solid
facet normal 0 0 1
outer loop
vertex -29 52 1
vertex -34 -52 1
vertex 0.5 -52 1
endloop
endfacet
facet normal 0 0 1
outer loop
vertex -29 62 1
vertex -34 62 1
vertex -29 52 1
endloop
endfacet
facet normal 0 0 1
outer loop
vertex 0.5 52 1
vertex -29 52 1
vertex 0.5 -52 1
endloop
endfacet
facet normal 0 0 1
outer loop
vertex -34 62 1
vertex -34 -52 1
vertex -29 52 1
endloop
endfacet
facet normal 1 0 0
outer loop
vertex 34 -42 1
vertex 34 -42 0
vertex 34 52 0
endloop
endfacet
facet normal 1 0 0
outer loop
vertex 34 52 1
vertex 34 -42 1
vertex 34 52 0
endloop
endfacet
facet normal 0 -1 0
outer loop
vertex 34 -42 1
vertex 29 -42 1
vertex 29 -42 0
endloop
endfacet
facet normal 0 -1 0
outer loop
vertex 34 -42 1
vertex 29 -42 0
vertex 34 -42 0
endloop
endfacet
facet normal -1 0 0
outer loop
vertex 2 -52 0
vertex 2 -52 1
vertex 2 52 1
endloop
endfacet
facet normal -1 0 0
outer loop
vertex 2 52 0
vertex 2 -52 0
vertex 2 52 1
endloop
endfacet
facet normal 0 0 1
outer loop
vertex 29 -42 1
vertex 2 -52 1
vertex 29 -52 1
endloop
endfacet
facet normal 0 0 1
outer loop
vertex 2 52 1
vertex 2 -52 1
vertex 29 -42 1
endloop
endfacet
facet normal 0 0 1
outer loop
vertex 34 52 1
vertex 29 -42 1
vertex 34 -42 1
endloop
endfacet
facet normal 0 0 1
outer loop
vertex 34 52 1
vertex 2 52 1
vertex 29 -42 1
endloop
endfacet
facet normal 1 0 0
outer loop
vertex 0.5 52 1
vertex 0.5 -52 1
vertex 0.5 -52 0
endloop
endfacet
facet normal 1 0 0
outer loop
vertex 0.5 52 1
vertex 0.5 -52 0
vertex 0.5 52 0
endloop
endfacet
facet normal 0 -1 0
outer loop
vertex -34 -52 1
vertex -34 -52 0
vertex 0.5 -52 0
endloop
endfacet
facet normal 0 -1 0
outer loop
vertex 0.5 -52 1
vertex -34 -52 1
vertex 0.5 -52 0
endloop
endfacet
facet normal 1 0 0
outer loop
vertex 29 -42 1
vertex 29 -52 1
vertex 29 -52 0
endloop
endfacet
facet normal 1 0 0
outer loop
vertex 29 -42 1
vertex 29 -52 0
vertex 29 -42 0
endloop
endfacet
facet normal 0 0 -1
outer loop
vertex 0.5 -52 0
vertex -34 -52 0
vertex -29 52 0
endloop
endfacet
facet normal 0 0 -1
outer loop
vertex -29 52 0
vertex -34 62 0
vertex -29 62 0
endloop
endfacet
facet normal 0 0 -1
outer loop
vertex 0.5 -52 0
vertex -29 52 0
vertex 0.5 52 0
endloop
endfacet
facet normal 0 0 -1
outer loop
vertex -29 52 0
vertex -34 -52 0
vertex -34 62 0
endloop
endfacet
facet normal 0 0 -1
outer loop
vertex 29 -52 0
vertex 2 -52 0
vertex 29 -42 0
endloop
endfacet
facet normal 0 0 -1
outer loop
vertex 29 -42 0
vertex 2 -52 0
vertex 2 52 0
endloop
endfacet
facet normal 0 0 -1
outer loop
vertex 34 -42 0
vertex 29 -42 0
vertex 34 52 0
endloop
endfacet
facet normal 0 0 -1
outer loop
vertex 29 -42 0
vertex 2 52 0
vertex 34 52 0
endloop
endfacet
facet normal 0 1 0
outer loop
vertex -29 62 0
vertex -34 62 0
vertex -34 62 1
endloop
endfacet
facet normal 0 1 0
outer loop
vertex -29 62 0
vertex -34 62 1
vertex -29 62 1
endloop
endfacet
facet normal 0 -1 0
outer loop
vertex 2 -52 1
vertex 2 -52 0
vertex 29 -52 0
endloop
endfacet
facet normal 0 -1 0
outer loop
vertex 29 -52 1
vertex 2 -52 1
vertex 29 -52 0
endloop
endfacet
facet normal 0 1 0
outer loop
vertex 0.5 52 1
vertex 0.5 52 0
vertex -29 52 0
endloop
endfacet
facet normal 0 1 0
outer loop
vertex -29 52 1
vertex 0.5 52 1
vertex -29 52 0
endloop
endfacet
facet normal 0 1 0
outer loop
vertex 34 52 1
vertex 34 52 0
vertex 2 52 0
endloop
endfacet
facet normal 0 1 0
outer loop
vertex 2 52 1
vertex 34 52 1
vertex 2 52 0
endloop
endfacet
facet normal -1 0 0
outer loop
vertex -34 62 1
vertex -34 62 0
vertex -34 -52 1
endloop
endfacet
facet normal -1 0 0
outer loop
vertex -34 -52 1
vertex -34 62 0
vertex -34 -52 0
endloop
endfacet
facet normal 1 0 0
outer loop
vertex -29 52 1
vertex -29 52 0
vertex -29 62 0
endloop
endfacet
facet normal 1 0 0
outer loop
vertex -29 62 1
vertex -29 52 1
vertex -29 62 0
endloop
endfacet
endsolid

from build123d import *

# Parameters (mm, degrees)
F0_W     = 5
F0_H     = 10
F0_W_2   = 0.5
F0_H_2   = 104
F0_W_3   = 33.5
F1_DEPTH = 1
F2_W     = 1.5
F2_H     = 104
F3_DEPTH = 1
F4_W     = 5
F4_H     = 10
F5_DEPTH = 1


with BuildPart() as f1:
    # F0 (on Top) → F1 (new body)
    with BuildSketch(Plane.XY):
        with Locations((-31.5, 57)):
            Rectangle(F0_W, F0_H)
        Polygon((-29, 52), (-34, 52), (-34, -52), (-0.5, -52), (-0.5, 52), align=None)
        with Locations((-0.25, 0)):
            Rectangle(F0_W_2, F0_H_2)
        with Locations((0.25, 0)):
            Rectangle(F0_W_2, F0_H_2)
        with Locations((17.25, 0)):
            Rectangle(F0_W_3, F0_H_2)
    extrude(amount=F1_DEPTH)

    # F2 (on face) → F3 (cut)
    with BuildSketch(Plane.XY.offset(1)):
        with Locations((1.25, 0)):
            Rectangle(F2_W, F2_H)
    extrude(amount=-F3_DEPTH, mode=Mode.SUBTRACT)

    # F4 (on face) → F5 (cut)
    with BuildSketch(Plane.XY.offset(1)):
        with Locations((31.5, -47)):
            Rectangle(F4_W, F4_H)
    extrude(amount=-F5_DEPTH, mode=Mode.SUBTRACT)


solid = f1.part
